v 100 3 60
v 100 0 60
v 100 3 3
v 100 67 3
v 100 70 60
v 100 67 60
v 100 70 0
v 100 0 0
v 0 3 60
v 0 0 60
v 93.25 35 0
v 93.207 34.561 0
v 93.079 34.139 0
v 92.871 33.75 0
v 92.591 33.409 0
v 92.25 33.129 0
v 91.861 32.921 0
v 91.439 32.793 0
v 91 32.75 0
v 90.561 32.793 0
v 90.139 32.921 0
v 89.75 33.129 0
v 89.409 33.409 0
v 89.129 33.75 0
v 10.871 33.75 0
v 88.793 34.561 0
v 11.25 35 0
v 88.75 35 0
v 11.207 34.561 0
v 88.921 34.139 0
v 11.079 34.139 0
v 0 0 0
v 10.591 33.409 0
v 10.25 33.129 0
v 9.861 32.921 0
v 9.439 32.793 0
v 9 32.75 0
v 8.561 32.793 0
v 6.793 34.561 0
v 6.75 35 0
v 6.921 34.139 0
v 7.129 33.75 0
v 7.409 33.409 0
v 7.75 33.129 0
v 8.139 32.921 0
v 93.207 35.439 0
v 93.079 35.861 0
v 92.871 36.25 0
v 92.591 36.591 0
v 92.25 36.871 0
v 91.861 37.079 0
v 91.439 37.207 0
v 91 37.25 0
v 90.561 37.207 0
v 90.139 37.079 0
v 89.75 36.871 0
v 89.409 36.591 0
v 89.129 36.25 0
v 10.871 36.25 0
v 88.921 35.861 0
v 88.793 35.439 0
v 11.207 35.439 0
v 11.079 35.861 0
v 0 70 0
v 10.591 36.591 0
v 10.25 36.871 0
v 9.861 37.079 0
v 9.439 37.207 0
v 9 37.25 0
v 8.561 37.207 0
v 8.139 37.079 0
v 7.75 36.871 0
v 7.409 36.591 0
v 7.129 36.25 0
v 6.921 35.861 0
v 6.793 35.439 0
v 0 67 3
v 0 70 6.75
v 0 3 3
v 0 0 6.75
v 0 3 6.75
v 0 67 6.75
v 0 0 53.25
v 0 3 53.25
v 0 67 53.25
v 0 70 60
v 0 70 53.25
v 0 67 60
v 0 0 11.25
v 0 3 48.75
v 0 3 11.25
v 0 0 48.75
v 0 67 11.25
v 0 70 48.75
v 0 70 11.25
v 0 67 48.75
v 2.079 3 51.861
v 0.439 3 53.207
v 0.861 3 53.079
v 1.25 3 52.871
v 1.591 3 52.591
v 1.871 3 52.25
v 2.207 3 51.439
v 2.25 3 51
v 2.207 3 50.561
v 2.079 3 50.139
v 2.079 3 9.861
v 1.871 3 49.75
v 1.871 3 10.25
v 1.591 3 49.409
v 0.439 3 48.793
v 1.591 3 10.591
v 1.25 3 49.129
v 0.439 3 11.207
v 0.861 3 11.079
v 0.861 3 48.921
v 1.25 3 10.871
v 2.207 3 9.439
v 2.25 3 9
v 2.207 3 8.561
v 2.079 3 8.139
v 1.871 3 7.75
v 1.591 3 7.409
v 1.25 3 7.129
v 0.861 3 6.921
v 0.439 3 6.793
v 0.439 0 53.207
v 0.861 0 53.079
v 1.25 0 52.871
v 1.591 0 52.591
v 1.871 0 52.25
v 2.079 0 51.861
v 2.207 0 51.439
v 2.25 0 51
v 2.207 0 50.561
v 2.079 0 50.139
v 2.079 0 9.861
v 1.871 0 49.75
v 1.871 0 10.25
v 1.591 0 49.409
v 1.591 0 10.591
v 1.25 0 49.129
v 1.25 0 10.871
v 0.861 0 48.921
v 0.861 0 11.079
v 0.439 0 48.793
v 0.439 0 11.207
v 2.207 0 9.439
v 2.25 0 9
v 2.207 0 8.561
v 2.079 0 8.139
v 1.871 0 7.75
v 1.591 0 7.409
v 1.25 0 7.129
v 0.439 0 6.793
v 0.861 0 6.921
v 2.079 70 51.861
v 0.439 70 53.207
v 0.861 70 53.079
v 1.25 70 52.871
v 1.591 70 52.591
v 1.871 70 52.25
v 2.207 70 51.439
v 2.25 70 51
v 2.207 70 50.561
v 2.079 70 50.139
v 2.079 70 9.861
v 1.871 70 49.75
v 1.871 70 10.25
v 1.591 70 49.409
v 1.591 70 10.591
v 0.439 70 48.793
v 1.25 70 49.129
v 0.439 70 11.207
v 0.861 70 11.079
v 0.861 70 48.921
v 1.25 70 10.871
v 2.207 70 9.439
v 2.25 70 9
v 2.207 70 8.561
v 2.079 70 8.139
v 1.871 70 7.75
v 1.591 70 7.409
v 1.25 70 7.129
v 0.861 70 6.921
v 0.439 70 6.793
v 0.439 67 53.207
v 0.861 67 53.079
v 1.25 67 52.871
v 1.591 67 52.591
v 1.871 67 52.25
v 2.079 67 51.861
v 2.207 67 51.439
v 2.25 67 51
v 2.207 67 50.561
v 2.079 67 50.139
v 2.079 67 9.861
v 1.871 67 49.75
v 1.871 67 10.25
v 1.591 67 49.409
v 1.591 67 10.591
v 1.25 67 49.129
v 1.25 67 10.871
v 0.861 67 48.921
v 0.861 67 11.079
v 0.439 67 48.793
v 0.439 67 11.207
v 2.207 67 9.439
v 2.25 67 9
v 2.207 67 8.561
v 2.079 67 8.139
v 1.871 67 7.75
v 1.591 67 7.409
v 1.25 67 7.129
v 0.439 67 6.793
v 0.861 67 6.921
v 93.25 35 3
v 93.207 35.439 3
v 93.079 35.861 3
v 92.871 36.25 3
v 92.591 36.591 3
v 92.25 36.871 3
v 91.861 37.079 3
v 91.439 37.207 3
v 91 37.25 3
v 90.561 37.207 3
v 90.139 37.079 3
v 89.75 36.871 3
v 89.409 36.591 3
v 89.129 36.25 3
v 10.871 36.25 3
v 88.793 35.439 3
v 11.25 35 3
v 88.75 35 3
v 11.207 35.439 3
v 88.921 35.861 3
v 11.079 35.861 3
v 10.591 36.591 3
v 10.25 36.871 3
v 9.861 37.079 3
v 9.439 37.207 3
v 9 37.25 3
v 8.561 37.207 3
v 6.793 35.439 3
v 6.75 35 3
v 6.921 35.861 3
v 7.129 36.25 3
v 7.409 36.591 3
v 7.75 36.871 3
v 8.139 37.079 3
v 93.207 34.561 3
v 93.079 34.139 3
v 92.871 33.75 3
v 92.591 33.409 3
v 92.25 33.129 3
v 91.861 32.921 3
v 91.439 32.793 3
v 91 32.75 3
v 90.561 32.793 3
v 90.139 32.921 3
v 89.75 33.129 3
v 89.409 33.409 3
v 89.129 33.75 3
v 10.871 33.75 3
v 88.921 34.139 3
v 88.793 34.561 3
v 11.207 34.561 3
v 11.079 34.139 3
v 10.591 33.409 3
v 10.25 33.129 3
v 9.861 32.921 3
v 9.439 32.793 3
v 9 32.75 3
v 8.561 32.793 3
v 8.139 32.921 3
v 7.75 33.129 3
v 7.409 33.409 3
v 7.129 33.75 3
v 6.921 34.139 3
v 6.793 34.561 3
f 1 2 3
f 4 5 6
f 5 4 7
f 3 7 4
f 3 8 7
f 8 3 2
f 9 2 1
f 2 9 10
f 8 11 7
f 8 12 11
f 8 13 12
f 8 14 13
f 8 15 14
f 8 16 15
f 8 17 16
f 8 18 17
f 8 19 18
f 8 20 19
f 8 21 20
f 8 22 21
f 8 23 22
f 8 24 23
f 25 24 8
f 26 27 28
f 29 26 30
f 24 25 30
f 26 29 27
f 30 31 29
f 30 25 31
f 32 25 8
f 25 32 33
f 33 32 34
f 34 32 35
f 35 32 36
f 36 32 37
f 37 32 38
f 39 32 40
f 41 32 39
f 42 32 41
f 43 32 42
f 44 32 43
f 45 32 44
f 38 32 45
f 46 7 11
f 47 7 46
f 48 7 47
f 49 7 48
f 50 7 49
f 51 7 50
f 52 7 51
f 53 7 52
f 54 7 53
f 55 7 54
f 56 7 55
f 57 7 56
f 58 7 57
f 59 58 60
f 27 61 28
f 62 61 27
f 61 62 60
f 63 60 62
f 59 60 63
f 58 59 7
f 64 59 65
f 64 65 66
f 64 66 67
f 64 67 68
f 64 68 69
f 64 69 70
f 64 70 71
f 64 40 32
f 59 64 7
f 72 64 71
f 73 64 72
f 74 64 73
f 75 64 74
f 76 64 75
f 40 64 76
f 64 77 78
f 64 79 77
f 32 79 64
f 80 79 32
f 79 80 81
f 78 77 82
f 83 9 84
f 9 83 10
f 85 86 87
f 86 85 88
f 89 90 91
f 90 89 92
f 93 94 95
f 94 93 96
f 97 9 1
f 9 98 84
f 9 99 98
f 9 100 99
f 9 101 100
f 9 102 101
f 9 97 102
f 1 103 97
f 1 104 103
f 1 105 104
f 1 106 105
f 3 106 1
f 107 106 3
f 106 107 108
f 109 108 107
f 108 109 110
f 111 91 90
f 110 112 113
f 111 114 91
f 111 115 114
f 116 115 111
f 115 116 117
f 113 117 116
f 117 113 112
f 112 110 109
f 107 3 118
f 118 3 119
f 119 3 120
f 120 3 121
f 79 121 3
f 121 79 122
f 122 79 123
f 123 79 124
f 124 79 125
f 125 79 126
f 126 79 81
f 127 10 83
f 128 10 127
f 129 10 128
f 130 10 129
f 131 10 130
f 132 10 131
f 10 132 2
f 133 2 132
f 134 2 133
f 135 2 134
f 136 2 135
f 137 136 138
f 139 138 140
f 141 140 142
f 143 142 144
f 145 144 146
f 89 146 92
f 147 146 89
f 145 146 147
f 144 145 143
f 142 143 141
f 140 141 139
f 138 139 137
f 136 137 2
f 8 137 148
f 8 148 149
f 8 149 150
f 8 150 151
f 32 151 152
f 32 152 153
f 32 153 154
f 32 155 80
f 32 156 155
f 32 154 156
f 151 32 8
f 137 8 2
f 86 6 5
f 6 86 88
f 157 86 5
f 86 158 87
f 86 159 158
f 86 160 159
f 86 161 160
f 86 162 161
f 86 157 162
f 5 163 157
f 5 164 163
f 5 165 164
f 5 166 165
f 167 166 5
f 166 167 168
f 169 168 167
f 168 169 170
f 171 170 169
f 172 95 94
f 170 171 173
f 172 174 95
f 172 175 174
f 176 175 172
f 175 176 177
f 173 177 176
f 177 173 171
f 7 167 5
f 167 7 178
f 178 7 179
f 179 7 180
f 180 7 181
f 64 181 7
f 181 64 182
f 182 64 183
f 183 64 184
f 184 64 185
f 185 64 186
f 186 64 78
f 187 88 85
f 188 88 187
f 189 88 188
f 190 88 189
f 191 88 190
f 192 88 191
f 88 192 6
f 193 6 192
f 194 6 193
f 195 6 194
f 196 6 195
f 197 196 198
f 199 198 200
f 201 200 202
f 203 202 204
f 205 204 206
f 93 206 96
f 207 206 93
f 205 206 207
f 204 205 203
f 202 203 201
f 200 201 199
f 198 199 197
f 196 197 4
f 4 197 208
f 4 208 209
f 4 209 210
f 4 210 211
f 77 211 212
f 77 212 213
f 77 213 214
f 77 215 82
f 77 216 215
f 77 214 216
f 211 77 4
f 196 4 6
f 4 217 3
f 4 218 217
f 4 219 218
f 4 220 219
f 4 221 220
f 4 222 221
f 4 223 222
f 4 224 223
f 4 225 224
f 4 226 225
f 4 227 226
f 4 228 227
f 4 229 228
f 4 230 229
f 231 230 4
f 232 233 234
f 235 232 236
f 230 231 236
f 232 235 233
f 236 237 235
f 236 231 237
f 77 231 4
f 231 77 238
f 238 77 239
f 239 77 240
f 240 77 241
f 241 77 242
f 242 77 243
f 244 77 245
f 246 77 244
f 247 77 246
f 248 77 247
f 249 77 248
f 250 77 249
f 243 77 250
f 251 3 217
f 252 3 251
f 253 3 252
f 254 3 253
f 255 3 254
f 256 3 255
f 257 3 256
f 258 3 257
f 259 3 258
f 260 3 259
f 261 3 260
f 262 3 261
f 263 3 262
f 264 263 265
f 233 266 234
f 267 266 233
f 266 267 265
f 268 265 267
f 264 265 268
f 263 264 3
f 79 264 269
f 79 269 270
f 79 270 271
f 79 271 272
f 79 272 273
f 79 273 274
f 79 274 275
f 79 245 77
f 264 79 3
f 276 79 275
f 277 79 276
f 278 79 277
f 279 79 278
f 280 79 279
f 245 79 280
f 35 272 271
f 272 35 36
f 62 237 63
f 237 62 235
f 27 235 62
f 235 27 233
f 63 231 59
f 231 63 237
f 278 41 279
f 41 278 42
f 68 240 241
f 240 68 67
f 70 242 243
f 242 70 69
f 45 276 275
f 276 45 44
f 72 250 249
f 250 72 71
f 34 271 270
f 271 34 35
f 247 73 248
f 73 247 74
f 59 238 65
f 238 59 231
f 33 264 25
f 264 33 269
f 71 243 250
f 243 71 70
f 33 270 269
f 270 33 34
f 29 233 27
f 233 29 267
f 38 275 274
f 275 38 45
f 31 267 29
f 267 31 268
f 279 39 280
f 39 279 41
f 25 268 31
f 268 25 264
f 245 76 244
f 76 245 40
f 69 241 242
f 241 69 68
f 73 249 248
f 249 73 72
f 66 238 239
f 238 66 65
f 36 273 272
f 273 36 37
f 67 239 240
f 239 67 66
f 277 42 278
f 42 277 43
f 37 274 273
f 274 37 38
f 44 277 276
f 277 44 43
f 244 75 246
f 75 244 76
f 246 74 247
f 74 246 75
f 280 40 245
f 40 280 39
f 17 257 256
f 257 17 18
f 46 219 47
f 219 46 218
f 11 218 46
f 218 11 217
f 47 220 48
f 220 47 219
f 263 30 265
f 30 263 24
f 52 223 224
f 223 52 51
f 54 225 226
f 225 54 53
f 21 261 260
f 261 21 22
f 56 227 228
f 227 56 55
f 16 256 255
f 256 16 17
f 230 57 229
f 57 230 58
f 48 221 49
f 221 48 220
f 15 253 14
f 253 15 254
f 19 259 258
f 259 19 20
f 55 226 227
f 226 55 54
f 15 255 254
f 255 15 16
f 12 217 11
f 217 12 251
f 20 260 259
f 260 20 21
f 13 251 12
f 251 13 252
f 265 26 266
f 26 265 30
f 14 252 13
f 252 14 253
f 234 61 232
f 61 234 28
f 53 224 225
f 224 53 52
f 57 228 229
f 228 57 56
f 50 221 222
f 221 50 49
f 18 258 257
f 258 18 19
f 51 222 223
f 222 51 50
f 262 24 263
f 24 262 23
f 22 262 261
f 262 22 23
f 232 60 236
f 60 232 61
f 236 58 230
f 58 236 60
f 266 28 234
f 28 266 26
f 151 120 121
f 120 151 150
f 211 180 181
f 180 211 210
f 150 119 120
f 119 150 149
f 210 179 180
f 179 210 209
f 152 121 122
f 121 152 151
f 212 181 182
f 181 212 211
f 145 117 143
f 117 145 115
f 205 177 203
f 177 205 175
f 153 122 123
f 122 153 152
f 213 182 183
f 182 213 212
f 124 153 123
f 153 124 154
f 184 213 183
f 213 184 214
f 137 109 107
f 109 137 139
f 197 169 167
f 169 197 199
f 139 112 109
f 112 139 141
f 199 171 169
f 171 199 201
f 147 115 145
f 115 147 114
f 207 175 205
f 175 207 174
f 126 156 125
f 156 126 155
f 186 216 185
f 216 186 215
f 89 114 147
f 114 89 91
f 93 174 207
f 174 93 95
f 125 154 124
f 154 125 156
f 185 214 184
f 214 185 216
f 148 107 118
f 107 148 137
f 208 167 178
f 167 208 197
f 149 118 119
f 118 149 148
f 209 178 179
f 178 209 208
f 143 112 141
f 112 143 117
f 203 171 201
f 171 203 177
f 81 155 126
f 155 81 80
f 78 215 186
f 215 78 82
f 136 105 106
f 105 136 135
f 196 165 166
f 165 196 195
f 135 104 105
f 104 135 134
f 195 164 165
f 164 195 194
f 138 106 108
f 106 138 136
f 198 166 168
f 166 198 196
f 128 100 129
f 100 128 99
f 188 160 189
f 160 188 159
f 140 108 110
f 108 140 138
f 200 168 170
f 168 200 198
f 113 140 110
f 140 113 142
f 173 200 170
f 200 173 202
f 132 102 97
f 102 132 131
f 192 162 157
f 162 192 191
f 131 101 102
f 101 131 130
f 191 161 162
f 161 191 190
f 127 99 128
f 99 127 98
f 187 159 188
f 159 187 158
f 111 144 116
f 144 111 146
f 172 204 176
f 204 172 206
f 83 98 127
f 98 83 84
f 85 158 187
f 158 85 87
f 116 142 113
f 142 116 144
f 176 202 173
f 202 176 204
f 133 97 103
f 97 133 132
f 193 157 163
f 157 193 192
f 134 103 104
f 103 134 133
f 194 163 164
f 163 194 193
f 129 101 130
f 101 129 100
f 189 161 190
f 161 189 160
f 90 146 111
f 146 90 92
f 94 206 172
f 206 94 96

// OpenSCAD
$fn = 32;

// ----------------------------------------------------------------------
// U-bracket: 100 x 70 x 60 mm
// ----------------------------------------------------------------------

// --- parameters (mm) ---
base_len = 100;           // outer length, X
channel_w = 70;           // outer width, Y
upright_h = 60;           // upright height, Z
mat_t = 3;                // wall thickness
hole_d = 4.5;             // clearance for M4

module hole_z(px, py) {
  translate([px, py, -0.5]) cylinder(h = mat_t + 1, d = hole_d);
}
module hole_y_pz(pz) {
  /* through both uprights along Y */
  translate([0, -0.5, pz]) rotate([-90, 0, 0]) cylinder(h = channel_w + 1, d = hole_d);
}

module base() {
  cube([base_len, channel_w, mat_t]);
}

module uprights() {
  cube([base_len, mat_t, upright_h]);
  translate([0, channel_w - mat_t, 0]) cube([base_len, mat_t, upright_h]);
}

difference() {
  union() {
    base();
    uprights();
  }
  hole_z(9, 35);
  hole_z(91, 35);
  hole_y_pz(9);
  hole_y_pz(51);
}
